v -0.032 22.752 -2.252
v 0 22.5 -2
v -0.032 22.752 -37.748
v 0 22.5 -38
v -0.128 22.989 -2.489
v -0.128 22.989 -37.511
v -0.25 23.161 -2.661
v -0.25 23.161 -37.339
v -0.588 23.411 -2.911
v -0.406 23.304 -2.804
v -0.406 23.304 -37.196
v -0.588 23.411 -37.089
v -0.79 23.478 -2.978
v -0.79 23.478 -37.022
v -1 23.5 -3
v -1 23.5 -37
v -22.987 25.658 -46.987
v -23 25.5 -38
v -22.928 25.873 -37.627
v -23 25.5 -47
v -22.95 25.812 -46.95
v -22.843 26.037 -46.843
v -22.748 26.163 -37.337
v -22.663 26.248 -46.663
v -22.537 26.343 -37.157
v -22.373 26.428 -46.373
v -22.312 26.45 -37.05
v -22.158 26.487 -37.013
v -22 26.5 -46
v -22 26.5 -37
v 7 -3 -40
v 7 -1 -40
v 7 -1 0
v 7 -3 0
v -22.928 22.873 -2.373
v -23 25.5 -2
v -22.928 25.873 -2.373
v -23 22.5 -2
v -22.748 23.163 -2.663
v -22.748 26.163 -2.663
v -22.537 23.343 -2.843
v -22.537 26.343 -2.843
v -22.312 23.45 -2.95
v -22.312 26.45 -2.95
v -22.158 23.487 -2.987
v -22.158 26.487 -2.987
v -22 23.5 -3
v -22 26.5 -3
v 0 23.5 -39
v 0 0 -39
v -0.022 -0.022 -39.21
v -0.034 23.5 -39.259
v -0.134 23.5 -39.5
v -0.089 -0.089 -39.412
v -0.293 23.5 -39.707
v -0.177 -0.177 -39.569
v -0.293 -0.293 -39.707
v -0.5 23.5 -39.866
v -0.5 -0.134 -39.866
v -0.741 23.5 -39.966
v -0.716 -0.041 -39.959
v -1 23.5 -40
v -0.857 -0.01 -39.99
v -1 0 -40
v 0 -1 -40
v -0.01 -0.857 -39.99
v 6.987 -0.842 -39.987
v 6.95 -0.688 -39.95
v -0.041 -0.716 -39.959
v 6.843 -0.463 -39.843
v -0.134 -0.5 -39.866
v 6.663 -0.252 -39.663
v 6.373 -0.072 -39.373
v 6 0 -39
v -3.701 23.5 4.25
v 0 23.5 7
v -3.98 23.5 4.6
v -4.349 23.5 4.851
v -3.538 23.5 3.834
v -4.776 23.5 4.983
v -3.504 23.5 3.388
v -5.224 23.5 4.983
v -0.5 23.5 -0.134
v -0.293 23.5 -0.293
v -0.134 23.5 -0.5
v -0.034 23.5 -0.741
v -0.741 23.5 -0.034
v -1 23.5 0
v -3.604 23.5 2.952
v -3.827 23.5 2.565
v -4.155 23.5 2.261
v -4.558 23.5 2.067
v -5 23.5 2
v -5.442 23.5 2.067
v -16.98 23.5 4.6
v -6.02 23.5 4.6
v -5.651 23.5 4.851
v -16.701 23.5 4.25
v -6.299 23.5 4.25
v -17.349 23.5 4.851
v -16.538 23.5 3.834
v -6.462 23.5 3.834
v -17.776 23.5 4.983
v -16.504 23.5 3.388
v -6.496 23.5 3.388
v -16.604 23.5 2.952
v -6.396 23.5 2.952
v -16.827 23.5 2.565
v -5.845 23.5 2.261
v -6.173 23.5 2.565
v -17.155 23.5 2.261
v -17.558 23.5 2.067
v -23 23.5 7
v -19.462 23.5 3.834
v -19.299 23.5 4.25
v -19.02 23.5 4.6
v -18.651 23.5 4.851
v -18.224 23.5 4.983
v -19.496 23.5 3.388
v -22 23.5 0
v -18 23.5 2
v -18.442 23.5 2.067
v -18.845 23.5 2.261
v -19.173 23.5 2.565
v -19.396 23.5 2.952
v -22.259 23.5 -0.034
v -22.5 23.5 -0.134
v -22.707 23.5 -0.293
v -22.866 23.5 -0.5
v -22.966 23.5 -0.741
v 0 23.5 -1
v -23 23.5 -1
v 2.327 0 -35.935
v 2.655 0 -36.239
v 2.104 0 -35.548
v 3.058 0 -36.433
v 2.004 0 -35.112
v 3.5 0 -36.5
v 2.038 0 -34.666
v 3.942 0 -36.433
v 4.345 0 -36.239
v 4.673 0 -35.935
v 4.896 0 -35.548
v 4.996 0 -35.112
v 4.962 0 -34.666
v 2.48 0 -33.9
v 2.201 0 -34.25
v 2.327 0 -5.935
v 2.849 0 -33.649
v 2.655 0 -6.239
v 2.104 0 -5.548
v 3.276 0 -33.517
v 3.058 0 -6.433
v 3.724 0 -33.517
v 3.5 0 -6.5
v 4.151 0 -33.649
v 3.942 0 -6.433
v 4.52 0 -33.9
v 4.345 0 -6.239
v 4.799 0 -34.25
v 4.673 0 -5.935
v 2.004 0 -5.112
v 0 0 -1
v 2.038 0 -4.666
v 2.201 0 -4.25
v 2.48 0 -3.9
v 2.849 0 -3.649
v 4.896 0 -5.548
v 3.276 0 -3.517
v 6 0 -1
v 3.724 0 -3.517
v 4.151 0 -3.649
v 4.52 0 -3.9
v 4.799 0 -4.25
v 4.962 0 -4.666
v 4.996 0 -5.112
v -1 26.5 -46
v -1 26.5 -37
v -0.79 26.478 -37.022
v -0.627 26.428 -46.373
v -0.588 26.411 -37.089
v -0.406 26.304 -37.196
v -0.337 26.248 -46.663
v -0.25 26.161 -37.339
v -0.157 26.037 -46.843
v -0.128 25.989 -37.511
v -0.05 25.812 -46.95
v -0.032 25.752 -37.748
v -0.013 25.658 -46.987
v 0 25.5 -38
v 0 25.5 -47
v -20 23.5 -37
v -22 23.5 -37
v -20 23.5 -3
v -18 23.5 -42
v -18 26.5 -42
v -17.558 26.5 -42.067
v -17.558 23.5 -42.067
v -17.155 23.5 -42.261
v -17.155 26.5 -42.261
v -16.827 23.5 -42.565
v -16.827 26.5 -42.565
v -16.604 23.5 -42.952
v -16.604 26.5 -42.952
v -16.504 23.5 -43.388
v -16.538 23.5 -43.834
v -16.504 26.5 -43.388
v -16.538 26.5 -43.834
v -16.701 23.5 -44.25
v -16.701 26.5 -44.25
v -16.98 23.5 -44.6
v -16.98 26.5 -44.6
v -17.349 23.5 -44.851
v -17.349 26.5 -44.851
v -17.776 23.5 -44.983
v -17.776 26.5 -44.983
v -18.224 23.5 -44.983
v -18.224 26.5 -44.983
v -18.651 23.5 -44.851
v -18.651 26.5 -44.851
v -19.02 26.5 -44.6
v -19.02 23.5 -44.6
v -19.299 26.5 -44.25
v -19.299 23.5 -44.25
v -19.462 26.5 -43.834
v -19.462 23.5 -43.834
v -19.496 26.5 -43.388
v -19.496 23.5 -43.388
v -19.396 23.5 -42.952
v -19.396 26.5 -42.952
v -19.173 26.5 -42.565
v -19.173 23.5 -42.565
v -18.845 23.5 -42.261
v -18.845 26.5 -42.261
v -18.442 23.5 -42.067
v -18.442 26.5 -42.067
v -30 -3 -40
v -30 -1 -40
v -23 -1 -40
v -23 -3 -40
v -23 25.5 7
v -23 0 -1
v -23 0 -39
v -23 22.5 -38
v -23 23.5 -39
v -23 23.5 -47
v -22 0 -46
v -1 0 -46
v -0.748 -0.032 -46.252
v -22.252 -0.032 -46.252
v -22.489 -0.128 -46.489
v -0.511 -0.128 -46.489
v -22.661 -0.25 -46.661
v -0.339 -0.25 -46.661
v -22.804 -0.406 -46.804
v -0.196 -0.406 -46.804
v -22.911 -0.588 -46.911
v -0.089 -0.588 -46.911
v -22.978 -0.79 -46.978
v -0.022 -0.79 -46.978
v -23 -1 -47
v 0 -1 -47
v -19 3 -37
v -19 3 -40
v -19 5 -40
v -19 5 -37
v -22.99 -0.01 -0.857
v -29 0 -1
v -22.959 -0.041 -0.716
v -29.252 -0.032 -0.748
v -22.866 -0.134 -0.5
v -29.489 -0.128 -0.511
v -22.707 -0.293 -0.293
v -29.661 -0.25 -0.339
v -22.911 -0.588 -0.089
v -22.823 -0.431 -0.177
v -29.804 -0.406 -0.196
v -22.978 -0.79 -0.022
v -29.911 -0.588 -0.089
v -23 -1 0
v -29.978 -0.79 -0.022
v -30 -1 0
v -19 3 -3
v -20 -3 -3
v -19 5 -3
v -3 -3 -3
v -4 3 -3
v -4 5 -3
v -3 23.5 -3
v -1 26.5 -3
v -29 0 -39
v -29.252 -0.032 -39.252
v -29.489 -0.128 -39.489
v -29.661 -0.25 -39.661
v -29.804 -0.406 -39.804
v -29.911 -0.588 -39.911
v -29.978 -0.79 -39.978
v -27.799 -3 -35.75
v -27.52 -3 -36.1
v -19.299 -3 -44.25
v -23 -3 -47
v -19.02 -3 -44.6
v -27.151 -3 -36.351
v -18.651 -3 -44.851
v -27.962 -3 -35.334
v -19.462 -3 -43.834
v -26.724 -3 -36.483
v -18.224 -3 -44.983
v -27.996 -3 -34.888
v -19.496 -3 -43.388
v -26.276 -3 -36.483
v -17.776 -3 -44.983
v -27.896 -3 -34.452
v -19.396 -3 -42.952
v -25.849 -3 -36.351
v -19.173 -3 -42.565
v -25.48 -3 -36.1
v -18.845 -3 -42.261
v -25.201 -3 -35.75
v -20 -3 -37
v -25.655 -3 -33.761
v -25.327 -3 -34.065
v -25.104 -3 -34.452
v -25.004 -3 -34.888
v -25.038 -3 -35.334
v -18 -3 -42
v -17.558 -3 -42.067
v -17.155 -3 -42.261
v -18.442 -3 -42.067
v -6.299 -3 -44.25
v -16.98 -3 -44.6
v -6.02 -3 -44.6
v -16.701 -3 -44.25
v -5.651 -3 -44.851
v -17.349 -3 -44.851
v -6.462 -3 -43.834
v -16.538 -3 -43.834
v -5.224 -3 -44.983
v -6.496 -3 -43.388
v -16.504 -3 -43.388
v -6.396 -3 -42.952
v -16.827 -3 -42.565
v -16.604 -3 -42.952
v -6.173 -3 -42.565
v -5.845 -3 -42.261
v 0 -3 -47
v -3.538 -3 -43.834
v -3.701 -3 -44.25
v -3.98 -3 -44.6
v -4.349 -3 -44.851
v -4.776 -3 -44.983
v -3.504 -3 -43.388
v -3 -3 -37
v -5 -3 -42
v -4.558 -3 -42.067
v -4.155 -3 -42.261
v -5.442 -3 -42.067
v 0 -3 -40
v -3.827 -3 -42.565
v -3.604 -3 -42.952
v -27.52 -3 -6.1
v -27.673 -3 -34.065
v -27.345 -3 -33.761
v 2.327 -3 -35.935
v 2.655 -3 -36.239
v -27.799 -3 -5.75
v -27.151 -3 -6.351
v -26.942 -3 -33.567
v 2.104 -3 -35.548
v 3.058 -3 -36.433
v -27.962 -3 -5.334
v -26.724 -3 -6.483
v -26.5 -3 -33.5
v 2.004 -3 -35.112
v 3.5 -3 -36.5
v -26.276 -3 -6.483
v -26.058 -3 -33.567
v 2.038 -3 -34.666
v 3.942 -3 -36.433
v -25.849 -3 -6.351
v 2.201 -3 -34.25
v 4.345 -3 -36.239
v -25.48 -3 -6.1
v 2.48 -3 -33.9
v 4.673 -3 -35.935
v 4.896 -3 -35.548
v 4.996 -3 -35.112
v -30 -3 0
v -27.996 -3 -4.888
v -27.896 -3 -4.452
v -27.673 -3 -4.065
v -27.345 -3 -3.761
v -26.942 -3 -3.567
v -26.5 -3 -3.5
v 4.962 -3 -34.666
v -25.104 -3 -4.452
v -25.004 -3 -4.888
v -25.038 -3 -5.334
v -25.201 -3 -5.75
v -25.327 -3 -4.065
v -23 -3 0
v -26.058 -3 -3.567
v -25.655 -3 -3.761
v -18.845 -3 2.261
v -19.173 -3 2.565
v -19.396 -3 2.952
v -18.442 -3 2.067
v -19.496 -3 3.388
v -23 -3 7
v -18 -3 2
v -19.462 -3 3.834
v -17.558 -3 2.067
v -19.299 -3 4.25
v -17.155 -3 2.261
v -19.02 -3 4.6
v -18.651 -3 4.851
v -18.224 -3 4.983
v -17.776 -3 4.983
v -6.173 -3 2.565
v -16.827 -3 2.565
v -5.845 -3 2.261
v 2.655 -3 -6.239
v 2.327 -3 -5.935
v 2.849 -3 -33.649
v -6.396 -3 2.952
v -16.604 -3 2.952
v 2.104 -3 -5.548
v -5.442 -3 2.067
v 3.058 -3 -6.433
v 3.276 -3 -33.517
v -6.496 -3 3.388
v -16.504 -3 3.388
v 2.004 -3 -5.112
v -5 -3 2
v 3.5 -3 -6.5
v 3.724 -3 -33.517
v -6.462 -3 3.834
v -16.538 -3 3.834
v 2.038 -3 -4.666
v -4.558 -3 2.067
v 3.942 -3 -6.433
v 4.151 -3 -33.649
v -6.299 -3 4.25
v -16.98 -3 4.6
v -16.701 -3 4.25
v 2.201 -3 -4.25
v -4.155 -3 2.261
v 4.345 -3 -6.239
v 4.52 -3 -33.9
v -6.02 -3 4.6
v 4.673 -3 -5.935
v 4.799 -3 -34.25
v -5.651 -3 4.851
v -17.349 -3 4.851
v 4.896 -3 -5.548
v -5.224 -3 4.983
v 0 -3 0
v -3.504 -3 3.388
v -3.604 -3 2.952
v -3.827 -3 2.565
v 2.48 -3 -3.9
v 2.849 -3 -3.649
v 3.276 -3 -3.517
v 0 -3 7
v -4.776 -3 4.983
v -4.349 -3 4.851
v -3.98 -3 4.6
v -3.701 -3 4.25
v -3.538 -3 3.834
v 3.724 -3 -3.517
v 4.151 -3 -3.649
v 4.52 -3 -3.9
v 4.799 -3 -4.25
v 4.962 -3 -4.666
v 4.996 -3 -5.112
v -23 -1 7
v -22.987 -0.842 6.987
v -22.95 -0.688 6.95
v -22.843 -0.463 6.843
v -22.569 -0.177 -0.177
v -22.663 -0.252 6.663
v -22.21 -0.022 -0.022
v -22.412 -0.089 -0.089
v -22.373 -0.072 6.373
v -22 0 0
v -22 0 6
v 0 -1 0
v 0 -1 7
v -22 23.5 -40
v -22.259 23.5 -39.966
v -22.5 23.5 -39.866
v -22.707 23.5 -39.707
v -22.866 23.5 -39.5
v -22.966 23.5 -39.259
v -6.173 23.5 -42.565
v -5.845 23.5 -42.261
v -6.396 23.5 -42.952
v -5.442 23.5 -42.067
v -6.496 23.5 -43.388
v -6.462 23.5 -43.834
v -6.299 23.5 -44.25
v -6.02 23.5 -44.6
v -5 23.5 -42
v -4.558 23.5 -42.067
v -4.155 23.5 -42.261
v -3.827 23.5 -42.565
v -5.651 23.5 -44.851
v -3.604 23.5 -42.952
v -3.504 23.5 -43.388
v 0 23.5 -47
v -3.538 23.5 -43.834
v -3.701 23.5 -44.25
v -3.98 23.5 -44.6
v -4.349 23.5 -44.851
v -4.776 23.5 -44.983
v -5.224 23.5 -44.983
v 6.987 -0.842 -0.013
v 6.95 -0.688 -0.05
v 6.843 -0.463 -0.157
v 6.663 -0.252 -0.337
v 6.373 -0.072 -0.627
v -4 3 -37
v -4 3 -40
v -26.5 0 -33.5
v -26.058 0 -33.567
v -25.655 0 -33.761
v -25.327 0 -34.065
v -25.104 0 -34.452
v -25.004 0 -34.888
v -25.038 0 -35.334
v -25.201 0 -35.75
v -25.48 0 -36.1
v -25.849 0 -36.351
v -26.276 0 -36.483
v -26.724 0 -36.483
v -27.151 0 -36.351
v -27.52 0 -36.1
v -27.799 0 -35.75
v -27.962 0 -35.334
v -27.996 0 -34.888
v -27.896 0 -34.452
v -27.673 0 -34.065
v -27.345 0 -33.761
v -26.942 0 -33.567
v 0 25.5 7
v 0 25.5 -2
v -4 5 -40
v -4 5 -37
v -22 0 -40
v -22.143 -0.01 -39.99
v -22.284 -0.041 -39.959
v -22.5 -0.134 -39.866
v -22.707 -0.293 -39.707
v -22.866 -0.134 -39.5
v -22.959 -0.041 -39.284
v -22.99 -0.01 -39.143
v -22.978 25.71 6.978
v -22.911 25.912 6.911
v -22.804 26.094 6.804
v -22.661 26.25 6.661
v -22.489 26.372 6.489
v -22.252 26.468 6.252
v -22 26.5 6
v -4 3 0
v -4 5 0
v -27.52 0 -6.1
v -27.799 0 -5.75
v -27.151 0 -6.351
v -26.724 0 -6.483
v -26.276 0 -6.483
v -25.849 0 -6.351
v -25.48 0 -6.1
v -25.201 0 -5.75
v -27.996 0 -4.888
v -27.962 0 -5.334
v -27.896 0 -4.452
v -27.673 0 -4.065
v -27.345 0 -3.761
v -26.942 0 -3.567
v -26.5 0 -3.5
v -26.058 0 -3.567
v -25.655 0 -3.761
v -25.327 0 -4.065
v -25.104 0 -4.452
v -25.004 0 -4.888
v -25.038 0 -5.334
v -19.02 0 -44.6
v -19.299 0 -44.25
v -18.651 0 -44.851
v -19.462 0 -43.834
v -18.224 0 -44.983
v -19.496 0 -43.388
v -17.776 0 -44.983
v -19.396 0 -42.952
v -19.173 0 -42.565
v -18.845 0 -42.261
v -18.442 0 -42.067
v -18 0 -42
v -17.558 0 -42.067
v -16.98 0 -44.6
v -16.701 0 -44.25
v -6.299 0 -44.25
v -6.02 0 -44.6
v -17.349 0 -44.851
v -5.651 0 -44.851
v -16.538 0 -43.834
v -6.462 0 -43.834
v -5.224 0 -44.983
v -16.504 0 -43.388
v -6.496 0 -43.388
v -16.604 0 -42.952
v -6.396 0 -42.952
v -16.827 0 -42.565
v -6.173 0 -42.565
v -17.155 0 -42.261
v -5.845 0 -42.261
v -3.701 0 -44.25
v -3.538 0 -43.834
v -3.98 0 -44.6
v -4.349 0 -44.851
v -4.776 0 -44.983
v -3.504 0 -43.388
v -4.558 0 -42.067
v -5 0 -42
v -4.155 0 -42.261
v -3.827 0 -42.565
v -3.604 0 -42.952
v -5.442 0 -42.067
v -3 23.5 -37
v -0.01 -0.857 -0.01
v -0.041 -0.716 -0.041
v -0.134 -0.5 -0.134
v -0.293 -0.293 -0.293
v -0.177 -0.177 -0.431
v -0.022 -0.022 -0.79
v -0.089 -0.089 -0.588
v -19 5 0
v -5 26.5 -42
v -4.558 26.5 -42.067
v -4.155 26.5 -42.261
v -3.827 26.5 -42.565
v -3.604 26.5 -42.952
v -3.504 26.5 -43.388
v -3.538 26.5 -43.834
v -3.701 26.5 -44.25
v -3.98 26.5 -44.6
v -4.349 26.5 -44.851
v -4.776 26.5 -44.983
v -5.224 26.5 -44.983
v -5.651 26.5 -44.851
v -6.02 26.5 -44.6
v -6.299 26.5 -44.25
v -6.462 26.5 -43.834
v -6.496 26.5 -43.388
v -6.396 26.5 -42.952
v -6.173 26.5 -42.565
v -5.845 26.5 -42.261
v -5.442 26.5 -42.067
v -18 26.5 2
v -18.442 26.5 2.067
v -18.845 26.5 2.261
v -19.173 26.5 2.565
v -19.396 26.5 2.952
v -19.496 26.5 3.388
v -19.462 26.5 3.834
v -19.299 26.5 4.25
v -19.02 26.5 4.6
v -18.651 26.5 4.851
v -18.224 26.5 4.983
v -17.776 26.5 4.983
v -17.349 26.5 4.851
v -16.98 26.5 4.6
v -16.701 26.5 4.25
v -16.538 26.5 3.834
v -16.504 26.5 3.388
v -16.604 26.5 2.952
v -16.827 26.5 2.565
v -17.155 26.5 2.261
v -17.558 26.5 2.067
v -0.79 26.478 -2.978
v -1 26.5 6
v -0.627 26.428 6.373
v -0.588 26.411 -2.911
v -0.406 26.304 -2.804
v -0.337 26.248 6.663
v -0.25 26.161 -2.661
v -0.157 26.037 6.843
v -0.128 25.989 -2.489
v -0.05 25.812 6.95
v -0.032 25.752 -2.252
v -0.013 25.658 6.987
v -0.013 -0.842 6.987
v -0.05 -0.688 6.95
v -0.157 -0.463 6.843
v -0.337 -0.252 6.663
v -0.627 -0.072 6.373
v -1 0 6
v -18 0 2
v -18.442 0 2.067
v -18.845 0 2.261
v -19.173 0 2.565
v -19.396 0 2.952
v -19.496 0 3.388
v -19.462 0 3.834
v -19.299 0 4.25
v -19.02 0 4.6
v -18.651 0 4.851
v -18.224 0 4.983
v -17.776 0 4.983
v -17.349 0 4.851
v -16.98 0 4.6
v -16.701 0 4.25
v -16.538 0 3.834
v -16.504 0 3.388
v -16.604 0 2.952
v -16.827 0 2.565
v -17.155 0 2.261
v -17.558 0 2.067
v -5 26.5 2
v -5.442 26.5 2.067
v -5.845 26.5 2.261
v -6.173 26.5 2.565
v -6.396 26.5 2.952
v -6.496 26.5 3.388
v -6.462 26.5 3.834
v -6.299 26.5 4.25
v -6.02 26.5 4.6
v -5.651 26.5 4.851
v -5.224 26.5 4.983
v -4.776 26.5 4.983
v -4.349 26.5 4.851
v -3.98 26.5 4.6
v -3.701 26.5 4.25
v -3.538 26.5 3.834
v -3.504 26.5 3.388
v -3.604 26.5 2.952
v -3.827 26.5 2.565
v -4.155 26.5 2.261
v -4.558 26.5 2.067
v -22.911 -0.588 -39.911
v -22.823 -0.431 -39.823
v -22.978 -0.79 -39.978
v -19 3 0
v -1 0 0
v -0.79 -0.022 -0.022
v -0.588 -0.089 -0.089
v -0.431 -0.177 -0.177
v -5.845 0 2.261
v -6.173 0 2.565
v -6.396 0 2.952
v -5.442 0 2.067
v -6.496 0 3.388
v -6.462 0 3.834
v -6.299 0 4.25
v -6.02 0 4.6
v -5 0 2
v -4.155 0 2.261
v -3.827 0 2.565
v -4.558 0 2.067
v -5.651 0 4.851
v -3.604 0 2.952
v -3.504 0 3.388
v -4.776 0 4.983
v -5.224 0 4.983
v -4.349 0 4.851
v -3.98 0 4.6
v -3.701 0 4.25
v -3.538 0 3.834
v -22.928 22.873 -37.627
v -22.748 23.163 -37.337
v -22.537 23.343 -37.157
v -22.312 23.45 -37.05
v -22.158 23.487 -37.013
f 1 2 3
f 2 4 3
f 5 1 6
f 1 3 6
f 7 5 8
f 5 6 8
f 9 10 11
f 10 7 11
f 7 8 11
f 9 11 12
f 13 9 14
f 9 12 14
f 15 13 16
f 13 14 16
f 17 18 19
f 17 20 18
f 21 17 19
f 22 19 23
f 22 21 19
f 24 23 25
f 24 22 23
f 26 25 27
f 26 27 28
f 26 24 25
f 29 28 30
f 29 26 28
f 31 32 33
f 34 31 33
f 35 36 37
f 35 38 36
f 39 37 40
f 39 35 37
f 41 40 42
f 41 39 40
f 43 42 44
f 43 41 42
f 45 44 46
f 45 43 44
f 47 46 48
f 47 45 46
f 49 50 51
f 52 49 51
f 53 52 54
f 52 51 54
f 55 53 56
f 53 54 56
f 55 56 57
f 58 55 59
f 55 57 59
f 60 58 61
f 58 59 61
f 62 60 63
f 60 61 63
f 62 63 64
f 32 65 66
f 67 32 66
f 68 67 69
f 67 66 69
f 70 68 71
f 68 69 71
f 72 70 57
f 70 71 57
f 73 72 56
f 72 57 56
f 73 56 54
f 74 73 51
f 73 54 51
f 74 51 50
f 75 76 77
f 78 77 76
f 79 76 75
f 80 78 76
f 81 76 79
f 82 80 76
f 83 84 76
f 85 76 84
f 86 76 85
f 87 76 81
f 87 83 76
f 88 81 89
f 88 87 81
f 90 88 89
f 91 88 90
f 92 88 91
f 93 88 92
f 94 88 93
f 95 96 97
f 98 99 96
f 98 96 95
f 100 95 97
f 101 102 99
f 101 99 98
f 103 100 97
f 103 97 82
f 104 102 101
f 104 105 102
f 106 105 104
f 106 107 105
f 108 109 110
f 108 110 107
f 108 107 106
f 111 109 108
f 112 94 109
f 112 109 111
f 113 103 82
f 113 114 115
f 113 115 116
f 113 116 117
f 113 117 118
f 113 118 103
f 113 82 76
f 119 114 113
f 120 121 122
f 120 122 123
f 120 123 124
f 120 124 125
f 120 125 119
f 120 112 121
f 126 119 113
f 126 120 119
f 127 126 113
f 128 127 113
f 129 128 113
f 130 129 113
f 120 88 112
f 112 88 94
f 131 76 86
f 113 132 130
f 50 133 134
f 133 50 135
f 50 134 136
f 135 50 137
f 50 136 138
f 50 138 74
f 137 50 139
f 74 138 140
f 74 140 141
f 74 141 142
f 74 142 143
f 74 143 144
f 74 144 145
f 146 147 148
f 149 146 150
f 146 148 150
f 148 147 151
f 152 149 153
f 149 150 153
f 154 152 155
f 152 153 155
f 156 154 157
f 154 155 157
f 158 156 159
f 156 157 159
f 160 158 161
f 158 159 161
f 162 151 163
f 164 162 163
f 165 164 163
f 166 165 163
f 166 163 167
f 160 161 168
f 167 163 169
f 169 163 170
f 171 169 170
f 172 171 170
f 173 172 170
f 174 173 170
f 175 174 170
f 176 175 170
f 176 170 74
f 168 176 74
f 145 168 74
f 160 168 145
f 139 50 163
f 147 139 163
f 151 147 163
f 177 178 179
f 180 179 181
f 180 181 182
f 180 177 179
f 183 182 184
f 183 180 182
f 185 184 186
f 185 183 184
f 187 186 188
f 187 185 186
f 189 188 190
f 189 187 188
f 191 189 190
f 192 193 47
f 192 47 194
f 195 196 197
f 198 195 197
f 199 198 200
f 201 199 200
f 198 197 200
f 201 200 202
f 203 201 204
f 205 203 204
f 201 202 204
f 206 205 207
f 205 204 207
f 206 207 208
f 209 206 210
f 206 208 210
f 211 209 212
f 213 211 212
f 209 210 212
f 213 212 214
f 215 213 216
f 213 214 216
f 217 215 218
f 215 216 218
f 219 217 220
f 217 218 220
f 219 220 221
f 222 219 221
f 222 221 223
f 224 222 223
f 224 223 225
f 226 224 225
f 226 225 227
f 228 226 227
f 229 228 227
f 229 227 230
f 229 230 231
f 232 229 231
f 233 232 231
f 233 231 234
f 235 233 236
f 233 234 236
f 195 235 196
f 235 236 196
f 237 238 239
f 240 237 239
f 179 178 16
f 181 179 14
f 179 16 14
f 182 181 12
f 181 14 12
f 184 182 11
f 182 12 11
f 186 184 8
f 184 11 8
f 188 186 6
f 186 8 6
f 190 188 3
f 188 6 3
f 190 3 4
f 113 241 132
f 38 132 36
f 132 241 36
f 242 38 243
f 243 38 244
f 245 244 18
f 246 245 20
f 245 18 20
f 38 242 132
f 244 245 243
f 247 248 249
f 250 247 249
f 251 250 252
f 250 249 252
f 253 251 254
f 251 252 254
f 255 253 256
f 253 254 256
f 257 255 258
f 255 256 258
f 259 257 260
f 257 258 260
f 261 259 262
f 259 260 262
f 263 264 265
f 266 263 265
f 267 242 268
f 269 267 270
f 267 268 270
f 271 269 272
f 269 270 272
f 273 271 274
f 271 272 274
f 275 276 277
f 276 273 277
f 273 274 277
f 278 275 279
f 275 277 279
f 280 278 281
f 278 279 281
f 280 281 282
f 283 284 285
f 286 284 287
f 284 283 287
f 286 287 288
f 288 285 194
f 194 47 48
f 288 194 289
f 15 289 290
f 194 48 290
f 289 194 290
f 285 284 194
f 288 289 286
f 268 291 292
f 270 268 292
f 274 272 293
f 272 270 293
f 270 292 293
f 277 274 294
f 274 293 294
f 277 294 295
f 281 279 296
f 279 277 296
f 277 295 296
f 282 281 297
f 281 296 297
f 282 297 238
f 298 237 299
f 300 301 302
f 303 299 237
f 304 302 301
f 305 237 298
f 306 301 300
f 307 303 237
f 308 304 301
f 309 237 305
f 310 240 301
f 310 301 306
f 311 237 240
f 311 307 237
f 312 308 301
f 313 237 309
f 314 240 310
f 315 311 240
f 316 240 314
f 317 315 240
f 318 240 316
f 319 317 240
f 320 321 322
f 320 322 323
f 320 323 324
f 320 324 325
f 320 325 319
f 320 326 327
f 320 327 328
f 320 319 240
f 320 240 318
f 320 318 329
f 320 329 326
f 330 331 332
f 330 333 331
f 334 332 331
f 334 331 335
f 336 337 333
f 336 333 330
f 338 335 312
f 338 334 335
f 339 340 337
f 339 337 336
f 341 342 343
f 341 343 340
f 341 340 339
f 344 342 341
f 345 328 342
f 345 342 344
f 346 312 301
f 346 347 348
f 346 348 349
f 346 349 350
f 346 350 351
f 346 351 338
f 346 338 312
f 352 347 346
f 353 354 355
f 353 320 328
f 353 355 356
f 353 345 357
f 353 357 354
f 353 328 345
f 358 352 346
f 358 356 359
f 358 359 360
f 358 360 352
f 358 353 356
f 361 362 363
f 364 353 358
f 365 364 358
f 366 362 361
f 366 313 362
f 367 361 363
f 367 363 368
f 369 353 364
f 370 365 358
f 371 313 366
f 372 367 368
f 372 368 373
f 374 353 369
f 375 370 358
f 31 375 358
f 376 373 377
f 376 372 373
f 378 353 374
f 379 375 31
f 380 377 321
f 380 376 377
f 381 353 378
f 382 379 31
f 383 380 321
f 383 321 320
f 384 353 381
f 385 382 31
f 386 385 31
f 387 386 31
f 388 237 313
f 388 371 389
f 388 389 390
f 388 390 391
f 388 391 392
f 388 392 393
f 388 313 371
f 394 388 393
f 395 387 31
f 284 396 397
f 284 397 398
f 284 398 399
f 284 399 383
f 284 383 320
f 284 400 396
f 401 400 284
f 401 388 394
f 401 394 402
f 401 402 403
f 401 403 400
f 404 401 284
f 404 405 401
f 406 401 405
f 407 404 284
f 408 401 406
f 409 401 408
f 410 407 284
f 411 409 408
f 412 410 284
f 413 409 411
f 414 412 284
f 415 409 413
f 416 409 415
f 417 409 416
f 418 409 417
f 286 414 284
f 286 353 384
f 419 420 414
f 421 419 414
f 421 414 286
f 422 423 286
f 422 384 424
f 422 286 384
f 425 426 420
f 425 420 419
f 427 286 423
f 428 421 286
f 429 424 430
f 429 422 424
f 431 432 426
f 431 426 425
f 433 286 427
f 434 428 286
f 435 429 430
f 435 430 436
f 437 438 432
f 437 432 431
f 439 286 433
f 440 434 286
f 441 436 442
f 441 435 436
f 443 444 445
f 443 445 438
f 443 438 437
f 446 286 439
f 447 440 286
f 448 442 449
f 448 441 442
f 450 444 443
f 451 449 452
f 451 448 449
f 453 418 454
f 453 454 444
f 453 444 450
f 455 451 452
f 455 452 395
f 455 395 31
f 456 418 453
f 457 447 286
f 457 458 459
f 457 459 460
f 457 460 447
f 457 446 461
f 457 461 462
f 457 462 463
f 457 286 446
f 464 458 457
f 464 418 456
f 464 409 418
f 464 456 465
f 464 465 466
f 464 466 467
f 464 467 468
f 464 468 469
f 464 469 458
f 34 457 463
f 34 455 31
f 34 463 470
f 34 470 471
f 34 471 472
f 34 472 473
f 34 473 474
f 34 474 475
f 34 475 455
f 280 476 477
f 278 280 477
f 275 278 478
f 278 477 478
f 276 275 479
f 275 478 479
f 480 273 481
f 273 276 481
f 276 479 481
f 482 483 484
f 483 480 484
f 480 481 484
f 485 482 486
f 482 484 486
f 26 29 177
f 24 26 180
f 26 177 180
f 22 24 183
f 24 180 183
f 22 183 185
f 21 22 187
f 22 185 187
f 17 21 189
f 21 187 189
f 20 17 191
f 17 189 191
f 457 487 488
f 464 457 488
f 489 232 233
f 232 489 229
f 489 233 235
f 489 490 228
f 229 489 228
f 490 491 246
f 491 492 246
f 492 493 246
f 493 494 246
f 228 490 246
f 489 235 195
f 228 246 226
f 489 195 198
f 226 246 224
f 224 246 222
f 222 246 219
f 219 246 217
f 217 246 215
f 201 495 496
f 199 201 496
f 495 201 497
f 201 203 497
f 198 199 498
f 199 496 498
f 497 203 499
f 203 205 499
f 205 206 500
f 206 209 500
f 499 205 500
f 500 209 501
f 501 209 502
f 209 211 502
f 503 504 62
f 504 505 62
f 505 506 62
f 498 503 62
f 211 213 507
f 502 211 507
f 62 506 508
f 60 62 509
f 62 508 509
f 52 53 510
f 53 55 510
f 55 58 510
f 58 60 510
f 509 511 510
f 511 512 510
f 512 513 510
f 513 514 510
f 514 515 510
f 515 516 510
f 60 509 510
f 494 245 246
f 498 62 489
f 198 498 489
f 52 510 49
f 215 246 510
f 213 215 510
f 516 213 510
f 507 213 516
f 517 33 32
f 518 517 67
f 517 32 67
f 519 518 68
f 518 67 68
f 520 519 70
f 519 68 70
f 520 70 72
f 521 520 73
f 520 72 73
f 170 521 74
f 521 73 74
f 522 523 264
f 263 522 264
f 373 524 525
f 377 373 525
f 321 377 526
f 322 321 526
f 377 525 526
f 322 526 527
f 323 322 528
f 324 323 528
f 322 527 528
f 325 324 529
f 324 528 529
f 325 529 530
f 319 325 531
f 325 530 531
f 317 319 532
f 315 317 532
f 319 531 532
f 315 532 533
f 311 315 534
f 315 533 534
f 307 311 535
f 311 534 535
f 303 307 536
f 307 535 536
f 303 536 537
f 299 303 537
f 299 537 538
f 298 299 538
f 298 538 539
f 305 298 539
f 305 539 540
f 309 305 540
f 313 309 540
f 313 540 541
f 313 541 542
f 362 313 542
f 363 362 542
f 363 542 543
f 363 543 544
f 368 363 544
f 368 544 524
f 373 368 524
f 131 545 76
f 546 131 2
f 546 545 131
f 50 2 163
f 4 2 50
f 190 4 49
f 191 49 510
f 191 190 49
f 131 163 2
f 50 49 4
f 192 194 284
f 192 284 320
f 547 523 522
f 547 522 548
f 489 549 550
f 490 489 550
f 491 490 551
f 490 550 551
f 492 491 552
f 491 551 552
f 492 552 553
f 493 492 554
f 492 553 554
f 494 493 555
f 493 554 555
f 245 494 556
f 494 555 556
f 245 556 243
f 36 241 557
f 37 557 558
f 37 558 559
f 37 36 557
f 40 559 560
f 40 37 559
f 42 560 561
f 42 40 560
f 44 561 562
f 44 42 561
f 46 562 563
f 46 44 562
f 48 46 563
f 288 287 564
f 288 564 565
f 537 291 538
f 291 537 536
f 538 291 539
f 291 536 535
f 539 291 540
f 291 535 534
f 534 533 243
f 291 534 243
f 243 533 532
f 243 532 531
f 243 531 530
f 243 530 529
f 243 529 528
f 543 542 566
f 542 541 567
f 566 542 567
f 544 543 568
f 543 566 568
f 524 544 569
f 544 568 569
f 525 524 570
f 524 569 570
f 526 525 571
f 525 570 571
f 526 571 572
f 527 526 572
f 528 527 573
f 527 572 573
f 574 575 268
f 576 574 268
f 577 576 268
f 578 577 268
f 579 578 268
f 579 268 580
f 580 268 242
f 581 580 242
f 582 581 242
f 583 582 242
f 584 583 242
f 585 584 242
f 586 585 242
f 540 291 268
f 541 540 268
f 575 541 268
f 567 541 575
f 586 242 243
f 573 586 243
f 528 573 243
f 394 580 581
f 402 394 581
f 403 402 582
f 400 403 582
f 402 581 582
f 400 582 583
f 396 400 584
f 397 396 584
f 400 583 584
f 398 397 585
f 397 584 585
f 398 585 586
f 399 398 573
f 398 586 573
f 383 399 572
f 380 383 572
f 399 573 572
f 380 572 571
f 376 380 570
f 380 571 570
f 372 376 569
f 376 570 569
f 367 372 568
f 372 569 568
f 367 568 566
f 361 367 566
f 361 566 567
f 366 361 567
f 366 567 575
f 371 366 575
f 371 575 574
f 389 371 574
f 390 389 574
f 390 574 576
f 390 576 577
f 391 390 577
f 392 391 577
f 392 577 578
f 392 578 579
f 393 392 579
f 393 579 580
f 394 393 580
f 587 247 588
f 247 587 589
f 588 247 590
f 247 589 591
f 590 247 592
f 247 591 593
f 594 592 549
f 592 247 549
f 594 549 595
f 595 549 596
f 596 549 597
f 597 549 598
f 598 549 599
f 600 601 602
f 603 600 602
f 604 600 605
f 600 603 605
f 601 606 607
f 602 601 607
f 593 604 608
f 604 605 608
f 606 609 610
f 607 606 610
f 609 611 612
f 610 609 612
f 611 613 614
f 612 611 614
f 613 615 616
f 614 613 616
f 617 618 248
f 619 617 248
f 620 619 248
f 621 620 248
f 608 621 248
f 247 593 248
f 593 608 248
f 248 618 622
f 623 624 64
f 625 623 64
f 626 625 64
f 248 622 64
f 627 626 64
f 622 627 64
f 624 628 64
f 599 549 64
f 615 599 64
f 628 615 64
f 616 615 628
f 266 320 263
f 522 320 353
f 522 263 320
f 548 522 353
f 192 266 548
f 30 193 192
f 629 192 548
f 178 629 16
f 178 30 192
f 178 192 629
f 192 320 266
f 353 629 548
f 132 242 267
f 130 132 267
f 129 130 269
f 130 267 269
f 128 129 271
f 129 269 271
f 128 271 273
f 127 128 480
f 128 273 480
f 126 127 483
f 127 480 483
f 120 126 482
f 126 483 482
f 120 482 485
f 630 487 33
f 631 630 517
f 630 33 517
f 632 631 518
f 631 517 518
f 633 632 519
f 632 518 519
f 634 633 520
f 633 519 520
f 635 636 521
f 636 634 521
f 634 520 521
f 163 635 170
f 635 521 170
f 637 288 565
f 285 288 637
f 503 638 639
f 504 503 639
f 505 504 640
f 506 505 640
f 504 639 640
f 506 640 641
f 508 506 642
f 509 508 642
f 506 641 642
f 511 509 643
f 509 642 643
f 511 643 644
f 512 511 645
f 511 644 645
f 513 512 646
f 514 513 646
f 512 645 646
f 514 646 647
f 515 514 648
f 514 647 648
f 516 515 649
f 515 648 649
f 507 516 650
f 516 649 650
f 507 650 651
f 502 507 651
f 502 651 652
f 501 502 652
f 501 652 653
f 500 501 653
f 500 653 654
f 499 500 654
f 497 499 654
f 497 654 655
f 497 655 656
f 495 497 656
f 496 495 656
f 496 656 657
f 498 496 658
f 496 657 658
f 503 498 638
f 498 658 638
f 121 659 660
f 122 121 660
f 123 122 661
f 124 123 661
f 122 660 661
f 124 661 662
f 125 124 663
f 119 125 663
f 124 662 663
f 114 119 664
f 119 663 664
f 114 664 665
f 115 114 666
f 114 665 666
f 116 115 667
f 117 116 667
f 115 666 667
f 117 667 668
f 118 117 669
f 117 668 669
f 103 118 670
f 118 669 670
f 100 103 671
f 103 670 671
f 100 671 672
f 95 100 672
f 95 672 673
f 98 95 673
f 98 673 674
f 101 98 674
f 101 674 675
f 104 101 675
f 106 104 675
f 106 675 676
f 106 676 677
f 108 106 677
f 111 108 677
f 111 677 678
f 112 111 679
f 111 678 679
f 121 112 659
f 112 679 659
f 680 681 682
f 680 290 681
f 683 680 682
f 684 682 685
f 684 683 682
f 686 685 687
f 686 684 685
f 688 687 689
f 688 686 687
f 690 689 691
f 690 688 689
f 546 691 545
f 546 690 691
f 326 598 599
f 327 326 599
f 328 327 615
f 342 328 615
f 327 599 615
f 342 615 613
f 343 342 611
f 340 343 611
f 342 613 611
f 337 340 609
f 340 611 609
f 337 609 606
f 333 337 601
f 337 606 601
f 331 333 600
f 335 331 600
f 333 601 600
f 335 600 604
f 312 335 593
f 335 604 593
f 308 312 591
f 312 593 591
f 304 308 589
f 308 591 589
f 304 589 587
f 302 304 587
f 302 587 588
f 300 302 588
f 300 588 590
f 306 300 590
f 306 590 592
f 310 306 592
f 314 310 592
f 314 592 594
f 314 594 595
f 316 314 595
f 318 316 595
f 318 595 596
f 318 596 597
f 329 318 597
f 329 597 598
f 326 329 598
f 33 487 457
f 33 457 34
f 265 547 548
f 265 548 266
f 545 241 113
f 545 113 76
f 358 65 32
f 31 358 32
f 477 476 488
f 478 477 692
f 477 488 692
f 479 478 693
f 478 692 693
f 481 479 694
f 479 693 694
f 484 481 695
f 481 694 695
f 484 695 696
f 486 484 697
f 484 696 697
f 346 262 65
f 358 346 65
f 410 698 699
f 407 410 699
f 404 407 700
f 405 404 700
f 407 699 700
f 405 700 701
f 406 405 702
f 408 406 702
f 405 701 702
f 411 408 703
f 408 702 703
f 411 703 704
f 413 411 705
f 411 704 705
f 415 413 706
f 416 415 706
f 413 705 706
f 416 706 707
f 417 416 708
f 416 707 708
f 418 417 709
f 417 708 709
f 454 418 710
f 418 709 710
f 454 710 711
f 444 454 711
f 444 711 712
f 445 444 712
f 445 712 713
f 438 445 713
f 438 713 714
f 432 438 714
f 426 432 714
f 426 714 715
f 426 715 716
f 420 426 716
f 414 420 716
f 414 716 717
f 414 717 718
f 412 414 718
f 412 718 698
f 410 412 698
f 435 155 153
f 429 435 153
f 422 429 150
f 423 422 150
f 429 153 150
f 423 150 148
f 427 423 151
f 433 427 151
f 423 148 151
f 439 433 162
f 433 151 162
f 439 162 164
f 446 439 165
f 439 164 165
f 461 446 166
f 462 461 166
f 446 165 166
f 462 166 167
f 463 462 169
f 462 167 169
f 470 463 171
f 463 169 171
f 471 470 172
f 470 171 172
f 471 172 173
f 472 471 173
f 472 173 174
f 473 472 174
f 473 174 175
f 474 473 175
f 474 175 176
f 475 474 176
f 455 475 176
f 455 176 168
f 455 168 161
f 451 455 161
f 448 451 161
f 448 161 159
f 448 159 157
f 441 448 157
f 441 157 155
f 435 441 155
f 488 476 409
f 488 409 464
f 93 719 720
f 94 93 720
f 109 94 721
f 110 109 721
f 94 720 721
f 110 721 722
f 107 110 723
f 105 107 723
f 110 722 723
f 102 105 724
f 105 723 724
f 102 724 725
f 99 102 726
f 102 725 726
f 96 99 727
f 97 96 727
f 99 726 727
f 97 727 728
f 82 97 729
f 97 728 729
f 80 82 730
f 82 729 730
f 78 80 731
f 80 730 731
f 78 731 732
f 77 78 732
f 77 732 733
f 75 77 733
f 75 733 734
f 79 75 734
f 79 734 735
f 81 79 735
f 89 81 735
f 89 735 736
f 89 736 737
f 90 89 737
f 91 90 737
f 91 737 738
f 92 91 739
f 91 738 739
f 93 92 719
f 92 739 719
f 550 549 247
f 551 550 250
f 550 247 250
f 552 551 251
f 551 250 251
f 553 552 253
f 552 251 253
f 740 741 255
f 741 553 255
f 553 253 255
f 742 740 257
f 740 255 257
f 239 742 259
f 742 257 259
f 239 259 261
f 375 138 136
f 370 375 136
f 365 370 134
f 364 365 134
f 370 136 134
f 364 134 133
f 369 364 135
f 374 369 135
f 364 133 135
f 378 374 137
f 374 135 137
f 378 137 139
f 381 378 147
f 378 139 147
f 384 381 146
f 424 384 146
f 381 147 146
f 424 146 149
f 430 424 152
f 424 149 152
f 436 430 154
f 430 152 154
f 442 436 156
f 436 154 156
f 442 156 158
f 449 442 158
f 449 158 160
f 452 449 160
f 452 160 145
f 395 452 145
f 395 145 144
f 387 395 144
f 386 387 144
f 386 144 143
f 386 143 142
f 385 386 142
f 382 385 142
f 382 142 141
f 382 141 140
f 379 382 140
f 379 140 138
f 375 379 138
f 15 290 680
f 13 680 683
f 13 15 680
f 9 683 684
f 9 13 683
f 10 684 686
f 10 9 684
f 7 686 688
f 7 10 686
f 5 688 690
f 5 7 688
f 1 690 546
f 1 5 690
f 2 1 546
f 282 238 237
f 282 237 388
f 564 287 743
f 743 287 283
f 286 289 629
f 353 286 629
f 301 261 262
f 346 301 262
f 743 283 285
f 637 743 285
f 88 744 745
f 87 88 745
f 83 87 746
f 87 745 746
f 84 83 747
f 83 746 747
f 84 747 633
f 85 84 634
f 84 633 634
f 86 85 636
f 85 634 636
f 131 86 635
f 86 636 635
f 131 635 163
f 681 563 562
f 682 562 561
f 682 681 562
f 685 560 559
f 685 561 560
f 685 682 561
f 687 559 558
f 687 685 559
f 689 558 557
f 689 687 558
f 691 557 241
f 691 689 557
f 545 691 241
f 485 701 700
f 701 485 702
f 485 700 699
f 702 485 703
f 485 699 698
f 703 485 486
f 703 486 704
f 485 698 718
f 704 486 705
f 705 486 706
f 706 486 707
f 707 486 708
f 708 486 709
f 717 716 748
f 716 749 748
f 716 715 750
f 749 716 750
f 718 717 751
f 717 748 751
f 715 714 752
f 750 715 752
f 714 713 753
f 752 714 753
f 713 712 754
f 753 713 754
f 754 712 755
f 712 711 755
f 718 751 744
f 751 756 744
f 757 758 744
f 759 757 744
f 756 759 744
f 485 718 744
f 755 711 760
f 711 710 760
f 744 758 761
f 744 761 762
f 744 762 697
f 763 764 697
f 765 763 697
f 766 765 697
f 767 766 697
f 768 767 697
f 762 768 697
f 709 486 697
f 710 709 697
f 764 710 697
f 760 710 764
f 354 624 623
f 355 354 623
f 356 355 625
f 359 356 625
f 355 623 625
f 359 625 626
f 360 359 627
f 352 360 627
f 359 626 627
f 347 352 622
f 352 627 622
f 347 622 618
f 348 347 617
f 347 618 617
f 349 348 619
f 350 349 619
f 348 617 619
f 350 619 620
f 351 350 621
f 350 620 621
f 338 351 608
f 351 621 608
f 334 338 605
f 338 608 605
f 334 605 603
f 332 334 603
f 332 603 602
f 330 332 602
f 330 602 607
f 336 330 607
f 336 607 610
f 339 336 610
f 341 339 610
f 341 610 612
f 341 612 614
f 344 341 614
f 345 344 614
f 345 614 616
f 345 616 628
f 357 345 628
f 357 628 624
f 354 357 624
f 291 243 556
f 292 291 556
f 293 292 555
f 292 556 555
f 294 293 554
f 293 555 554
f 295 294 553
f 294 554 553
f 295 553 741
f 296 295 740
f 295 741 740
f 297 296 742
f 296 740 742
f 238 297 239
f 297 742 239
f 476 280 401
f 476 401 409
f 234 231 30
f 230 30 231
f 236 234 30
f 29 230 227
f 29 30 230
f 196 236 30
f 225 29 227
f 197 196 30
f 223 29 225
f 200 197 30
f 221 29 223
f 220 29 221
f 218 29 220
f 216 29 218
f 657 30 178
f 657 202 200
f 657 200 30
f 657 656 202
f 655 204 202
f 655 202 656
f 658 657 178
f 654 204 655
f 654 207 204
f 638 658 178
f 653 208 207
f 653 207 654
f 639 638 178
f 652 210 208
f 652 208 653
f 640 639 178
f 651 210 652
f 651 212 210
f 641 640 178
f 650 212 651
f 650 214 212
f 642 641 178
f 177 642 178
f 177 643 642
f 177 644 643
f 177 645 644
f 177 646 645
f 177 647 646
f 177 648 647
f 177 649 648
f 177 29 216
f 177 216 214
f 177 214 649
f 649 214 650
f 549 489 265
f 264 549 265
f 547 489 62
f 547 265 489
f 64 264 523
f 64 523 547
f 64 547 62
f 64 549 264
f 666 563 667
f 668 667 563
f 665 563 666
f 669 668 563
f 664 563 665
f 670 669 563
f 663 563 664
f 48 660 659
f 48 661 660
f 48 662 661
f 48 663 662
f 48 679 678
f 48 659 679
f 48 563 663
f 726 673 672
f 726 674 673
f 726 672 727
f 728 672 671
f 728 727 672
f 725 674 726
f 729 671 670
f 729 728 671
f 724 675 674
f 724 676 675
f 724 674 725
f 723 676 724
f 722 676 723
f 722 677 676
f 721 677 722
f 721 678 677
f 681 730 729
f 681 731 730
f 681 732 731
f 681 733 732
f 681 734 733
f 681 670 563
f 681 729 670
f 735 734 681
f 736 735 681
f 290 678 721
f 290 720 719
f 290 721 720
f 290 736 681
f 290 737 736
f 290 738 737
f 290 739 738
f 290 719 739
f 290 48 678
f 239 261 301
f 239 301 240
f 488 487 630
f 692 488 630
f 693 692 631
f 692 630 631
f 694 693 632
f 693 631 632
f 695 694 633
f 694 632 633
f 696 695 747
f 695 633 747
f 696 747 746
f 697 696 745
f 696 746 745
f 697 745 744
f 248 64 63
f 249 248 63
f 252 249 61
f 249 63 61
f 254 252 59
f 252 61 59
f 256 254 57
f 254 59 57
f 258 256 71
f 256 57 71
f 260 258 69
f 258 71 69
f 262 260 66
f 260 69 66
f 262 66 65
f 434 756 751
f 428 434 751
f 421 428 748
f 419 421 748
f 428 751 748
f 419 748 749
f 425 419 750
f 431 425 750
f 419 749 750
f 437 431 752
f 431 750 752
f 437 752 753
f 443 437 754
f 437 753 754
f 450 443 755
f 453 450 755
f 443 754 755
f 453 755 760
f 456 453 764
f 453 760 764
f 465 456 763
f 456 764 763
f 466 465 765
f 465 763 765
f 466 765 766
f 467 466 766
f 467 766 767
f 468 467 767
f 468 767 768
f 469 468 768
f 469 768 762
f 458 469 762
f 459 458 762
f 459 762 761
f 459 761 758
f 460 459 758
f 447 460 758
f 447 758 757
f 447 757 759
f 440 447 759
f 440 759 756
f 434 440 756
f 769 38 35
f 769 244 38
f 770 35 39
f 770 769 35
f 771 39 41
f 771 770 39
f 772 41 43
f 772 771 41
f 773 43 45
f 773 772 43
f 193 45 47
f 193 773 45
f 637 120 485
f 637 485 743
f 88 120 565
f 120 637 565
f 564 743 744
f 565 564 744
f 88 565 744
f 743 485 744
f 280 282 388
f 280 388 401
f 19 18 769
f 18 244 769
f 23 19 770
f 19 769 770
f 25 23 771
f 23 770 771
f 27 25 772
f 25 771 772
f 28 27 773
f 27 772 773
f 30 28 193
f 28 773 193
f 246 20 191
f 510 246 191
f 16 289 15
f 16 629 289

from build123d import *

# Parameters (mm, degrees)
CROQUIS2_W              = 23
CROQUIS2_H              = 40
SALIENTE_EXTRUIR1_DEPTH = 23.5
CROQUIS3_W              = 17
CROQUIS3_H              = 34
CORTAR_EXTRUIR1_DEPTH   = 13.5
CROQUIS4_W              = 13
CROQUIS4_H              = 40
CROQUIS4_W_2            = 23
CROQUIS4_H_2            = 13
SALIENTE_EXTRUIR6_DEPTH = 3
CROQUIS6_R              = 1.5
CORTAR_EXTRUIR2_DEPTH   = 61.508263898
SALIENTE_EXTRUIR7_START = 3
CROQUIS7_W              = 23
CROQUIS7_H              = 10
CROQUIS7_R              = 1.5
SALIENTE_EXTRUIR7_DEPTH = 3
REDONDEO1_R             = 1
REDONDEO2_R             = 1
REDONDEO3_R             = 1
CROQUIS8_W              = 17
CROQUIS8_H              = 34
CORTAR_EXTRUIR3_DEPTH   = 64.081296753
CROQUIS9_W              = 15
CROQUIS9_H              = 2
CORTAR_EXTRUIR4_DEPTH   = 62.735322142


with BuildPart() as part:
    # Croquis2 → Saliente-Extruir1 (new body)
    with BuildSketch(Plane(origin=(0, 0, 0), x_dir=(1, 0, 0), z_dir=(0, 1, 0))):
        with Locations((-11.5, 20)):
            Rectangle(CROQUIS2_W, CROQUIS2_H)
    extrude(amount=SALIENTE_EXTRUIR1_DEPTH)

    # Croquis3 → Cortar-Extruir1 (cut)
    with BuildSketch(Plane(origin=(0, 23.5, 0), x_dir=(1, 0, 0), z_dir=(0, 1, 0))):
        with Locations((-11.5, 20)):
            Rectangle(CROQUIS3_W, CROQUIS3_H)
    extrude(amount=-CORTAR_EXTRUIR1_DEPTH, mode=Mode.SUBTRACT)

    # Croquis4 → Saliente-Extruir6 (add)
    with BuildSketch(Plane.XZ):
        with Locations((-23.5, -20)):
            Rectangle(CROQUIS4_W, CROQUIS4_H)
        with Locations((-11.5, 0.5)):
            Rectangle(CROQUIS4_W_2, CROQUIS4_H_2)
        with Locations((0.5, -20)):
            Rectangle(CROQUIS4_W, CROQUIS4_H)
        with Locations((-11.5, -40.5)):
            Rectangle(CROQUIS4_W_2, CROQUIS4_H_2)
    extrude(amount=SALIENTE_EXTRUIR6_DEPTH)

    # Croquis6 → Cortar-Extruir2 (cut, through all)
    with BuildSketch(Plane(origin=(0, 0, 0), x_dir=(1, 0, 0), z_dir=(0, 1, 0))):
        with Locations(Location((-26.5, 5, 0), (0, 0, 270))):
            Circle(CROQUIS6_R)
        with Locations(Location((-26.5, 35, 0), (0, 0, 270))):
            Circle(CROQUIS6_R)
        with Locations(Location((-18, 43.5, 0), (0, 0, 270))):
            Circle(CROQUIS6_R)
        with Locations(Location((-5, 43.5, 0), (0, 0, 270))):
            Circle(CROQUIS6_R)
        with Locations(Location((3.5, 5, 0), (0, 0, 90))):
            Circle(CROQUIS6_R)
        with Locations(Location((3.5, 35, 0), (0, 0, 90))):
            Circle(CROQUIS6_R)
        with Locations(Location((-5, -3.5, 0), (0, 0, 90))):
            Circle(CROQUIS6_R)
        with Locations(Location((-18, -3.5, 0), (0, 0, 90))):
            Circle(CROQUIS6_R)
    extrude(amount=-CORTAR_EXTRUIR2_DEPTH, mode=Mode.SUBTRACT)

    # Croquis7 → Saliente-Extruir7 (add)
    # profile 1 of 2: a face of its own
    with BuildSketch(Plane(origin=(0, 23.5, 0), x_dir=(1, 0, 0), z_dir=(0, 1, 0)).offset(SALIENTE_EXTRUIR7_START)):
        with Locations((-11.5, 42)):
            Rectangle(CROQUIS7_W, CROQUIS7_H)
        with Locations(Location((-18, 43.5, 0), (0, 0, 270))):
            Circle(CROQUIS7_R, mode=Mode.SUBTRACT)
        with Locations(Location((-5, 43.5, 0), (0, 0, 270))):
            Circle(CROQUIS7_R, mode=Mode.SUBTRACT)
    # profile 2 of 2: a face of its own
    with BuildSketch(Plane(origin=(0, 23.5, 0), x_dir=(1, 0, 0), z_dir=(0, 1, 0)).offset(SALIENTE_EXTRUIR7_START)):
        with Locations((-11.5, -2)):
            Rectangle(CROQUIS7_W, CROQUIS7_H)
        with Locations(Location((-18, -3.5, 0), (0, 0, 90))):
            Circle(CROQUIS7_R, mode=Mode.SUBTRACT)
        with Locations(Location((-5, -3.5, 0), (0, 0, 90))):
            Circle(CROQUIS7_R, mode=Mode.SUBTRACT)
    extrude(amount=-SALIENTE_EXTRUIR7_DEPTH)

    # Redondeo1
    # the kernel refuses this fillet: 1 mm, written as the material it takes off along each edge
    with BuildSketch(Plane(origin=(-23, 0, -40), x_dir=(0, 0, 1), z_dir=(0, 1, 0)), Plane(origin=(-23, 0, 0), x_dir=(1, 0, 0), z_dir=(0, 1, 0))) as redondeo1_piece_1:
        with BuildLine():
            CenterArc((REDONDEO1_R, REDONDEO1_R), REDONDEO1_R, 180, 90)
            Line((0, REDONDEO1_R), (0, 0))
            Line((0, 0), (REDONDEO1_R, 0))
        make_face()
    extrude(amount=23.5, mode=Mode.SUBTRACT)
    with BuildSketch(Plane(origin=(0, 0, -40), x_dir=(0, 0, 1), z_dir=(0, 1, 0)), Plane(origin=(0, 0, 0), x_dir=(-1, 0, 0), z_dir=(0, 1, 0))) as redondeo1_piece_2:
        with BuildLine():
            CenterArc((REDONDEO1_R, -REDONDEO1_R), REDONDEO1_R, 90, 90)
            Line((0, -REDONDEO1_R), (0, 0))
            Line((0, 0), (REDONDEO1_R, 0))
        make_face()
    extrude(amount=23.5, mode=Mode.SUBTRACT)

    # Redondeo2
    # the kernel refuses this fillet: 1 mm, written as the material it takes off along each edge
    with BuildSketch(Plane(origin=(-30, 0, -42.5), x_dir=(1, 0, 0), z_dir=(0, 0, 1))) as redondeo2_piece_1:
        with BuildLine():
            CenterArc((REDONDEO2_R, -REDONDEO2_R), REDONDEO2_R, 90, 90)
            Line((0, -REDONDEO2_R), (0, 0))
            Line((0, 0), (REDONDEO2_R, 0))
        make_face()
    extrude(amount=45, mode=Mode.SUBTRACT)
    with BuildSketch(Plane(origin=(-32.5, 0, 0), x_dir=(0, 0, -1), z_dir=(1, 0, 0)), Plane(origin=(-23, 0, -40), x_dir=(0, 0, 1), z_dir=(-1, 0, 0)), Plane(origin=(0, 0, -40), x_dir=(-1, 0, 0), z_dir=(0, 0, -1)), Plane(origin=(-23, 0, -49.5), x_dir=(1, 0, 0), z_dir=(0, 0, 1))) as redondeo2_piece_2:
        with BuildLine():
            CenterArc((REDONDEO2_R, -REDONDEO2_R), REDONDEO2_R, 90, 90)
            Line((0, -REDONDEO2_R), (0, 0))
            Line((0, 0), (REDONDEO2_R, 0))
        make_face()
    extrude(amount=9.5, mode=Mode.SUBTRACT)
    with BuildSketch(Plane(origin=(9.5, 0, 0), x_dir=(0, 0, -1), z_dir=(-1, 0, 0)), Plane(origin=(-23, 0, 9.5), x_dir=(1, 0, 0), z_dir=(0, 0, -1)), Plane(origin=(0, 0, -40), x_dir=(0, 0, 1), z_dir=(1, 0, 0)), Plane(origin=(0, 0, 0), x_dir=(-1, 0, 0), z_dir=(0, 0, 1))) as redondeo2_piece_3:
        with BuildLine():
            CenterArc((REDONDEO2_R, REDONDEO2_R), REDONDEO2_R, 180, 90)
            Line((0, REDONDEO2_R), (0, 0))
            Line((0, 0), (REDONDEO2_R, 0))
        make_face()
    extrude(amount=9.5, mode=Mode.SUBTRACT)
    with BuildSketch(Plane(origin=(2.5, 0, 7), x_dir=(0, 0, -1), z_dir=(-1, 0, 0))) as redondeo2_piece_4:
        with BuildLine():
            CenterArc((REDONDEO2_R, REDONDEO2_R), REDONDEO2_R, 180, 90)
            Line((0, REDONDEO2_R), (0, 0))
            Line((0, 0), (REDONDEO2_R, 0))
        make_face()
    extrude(amount=28, mode=Mode.SUBTRACT)
    with BuildSketch(Plane(origin=(7, 0, -42.5), x_dir=(-1, 0, 0), z_dir=(0, 0, 1))) as redondeo2_piece_5:
        with BuildLine():
            CenterArc((REDONDEO2_R, REDONDEO2_R), REDONDEO2_R, 180, 90)
            Line((0, REDONDEO2_R), (0, 0))
            Line((0, 0), (REDONDEO2_R, 0))
        make_face()
    extrude(amount=45, mode=Mode.SUBTRACT)
    with BuildSketch(Plane(origin=(2.5, 0, -47), x_dir=(0, 0, 1), z_dir=(-1, 0, 0))) as redondeo2_piece_6:
        with BuildLine():
            CenterArc((REDONDEO2_R, -REDONDEO2_R), REDONDEO2_R, 90, 90)
            Line((0, -REDONDEO2_R), (0, 0))
            Line((0, 0), (REDONDEO2_R, 0))
        make_face()
    extrude(amount=28, mode=Mode.SUBTRACT)
    with BuildSketch(Plane(origin=(-32.5, 0, 0), x_dir=(0, 0, -1), z_dir=(1, 0, 0))) as redondeo2_piece_7a_section:
        with BuildLine():
            CenterArc((REDONDEO2_R, -REDONDEO2_R), REDONDEO2_R, 90, 90)
            Line((0, -REDONDEO2_R), (0, 0))
            Line((0, 0), (REDONDEO2_R, 0))
        make_face()
    redondeo2_piece_7a = extrude(amount=12, mode=Mode.PRIVATE)
    redondeo2_piece_7a = redondeo2_piece_7a - Plane(origin=(-22, -0.287823154, -1), x_dir=(1, 0, 0), z_dir=(0, -1, 0)) * Cylinder(1, 28, mode=Mode.PRIVATE)
    redondeo2_piece_7a = split(redondeo2_piece_7a, bisect_by=Plane(origin=(-23, -0.287823154, -0.287823154), z_dir=(1, 0, 0)), keep=Keep.TOP, mode=Mode.PRIVATE)
    with BuildSketch(Plane(origin=(-23, 0, 9.5), x_dir=(1, 0, 0), z_dir=(0, 0, -1))) as redondeo2_piece_7b_section:
        with BuildLine():
            CenterArc((REDONDEO2_R, REDONDEO2_R), REDONDEO2_R, 180, 90)
            Line((0, REDONDEO2_R), (0, 0))
            Line((0, 0), (REDONDEO2_R, 0))
        make_face()
    redondeo2_piece_7b = extrude(amount=12, mode=Mode.PRIVATE)
    redondeo2_piece_7b = split(redondeo2_piece_7b, bisect_by=Plane(origin=(-22.712176846, -0.287823154, 0), z_dir=(0, 0, -1)), keep=Keep.TOP, mode=Mode.PRIVATE)
    redondeo2_piece_7b = redondeo2_piece_7b - Plane(origin=(-22, -0.287823154, -1), x_dir=(1, 0, 0), z_dir=(0, -1, 0)) * Cylinder(1, 29, mode=Mode.PRIVATE)
    redondeo2_piece_7 = redondeo2_piece_7a & redondeo2_piece_7b
    add(redondeo2_piece_7, mode=Mode.SUBTRACT)
    with BuildSketch(Plane(origin=(-23, 0, -49.5), x_dir=(1, 0, 0), z_dir=(0, 0, 1))) as redondeo2_piece_8a_section:
        with BuildLine():
            CenterArc((REDONDEO2_R, -REDONDEO2_R), REDONDEO2_R, 90, 90)
            Line((0, -REDONDEO2_R), (0, 0))
            Line((0, 0), (REDONDEO2_R, 0))
        make_face()
    redondeo2_piece_8a = extrude(amount=12, mode=Mode.PRIVATE)
    redondeo2_piece_8a = redondeo2_piece_8a - Plane(origin=(-22, -0.287823154, -39), x_dir=(0, 0, 1), z_dir=(0, -1, 0)) * Cylinder(1, 28, mode=Mode.PRIVATE)
    redondeo2_piece_8a = split(redondeo2_piece_8a, bisect_by=Plane(origin=(-22.712176846, -0.287823154, -40), z_dir=(0, 0, 1)), keep=Keep.TOP, mode=Mode.PRIVATE)
    with BuildSketch(Plane(origin=(-20.5, 0, -40), x_dir=(0, 0, 1), z_dir=(-1, 0, 0))) as redondeo2_piece_8b_section:
        with BuildLine():
            CenterArc((REDONDEO2_R, -REDONDEO2_R), REDONDEO2_R, 90, 90)
            Line((0, -REDONDEO2_R), (0, 0))
            Line((0, 0), (REDONDEO2_R, 0))
        make_face()
    redondeo2_piece_8b = extrude(amount=12, mode=Mode.PRIVATE)
    redondeo2_piece_8b = split(redondeo2_piece_8b, bisect_by=Plane(origin=(-23, -0.287823154, -39.712176846), z_dir=(1, 0, 0)), keep=Keep.TOP, mode=Mode.PRIVATE)
    redondeo2_piece_8b = redondeo2_piece_8b - Plane(origin=(-22, -0.287823154, -39), x_dir=(0, 0, 1), z_dir=(0, -1, 0)) * Cylinder(1, 28, mode=Mode.PRIVATE)
    redondeo2_piece_8 = redondeo2_piece_8a & redondeo2_piece_8b
    add(redondeo2_piece_8, mode=Mode.SUBTRACT)
    with BuildSketch(Plane(origin=(0, 0, -2.5), x_dir=(-1, 0, 0), z_dir=(0, 0, 1))) as redondeo2_piece_9a_section:
        with BuildLine():
            CenterArc((REDONDEO2_R, REDONDEO2_R), REDONDEO2_R, 180, 90)
            Line((0, REDONDEO2_R), (0, 0))
            Line((0, 0), (REDONDEO2_R, 0))
        make_face()
    redondeo2_piece_9a = extrude(amount=12, mode=Mode.PRIVATE)
    redondeo2_piece_9a = split(redondeo2_piece_9a, bisect_by=Plane(origin=(-0.287823154, -0.287823154, 0), z_dir=(0, 0, -1)), keep=Keep.TOP, mode=Mode.PRIVATE)
    redondeo2_piece_9a = redondeo2_piece_9a - Plane(origin=(-1, -0.287823154, -1), x_dir=(-1, 0, 0), z_dir=(0, -1, 0)) * Cylinder(1, 29, mode=Mode.PRIVATE)
    with BuildSketch(Plane(origin=(9.5, 0, 0), x_dir=(0, 0, -1), z_dir=(-1, 0, 0))) as redondeo2_piece_9b_section:
        with BuildLine():
            CenterArc((REDONDEO2_R, REDONDEO2_R), REDONDEO2_R, 180, 90)
            Line((0, REDONDEO2_R), (0, 0))
            Line((0, 0), (REDONDEO2_R, 0))
        make_face()
    redondeo2_piece_9b = extrude(amount=12, mode=Mode.PRIVATE)
    redondeo2_piece_9b = split(redondeo2_piece_9b, bisect_by=Plane(origin=(0, -0.287823154, -0.287823154), z_dir=(-1, 0, 0)), keep=Keep.TOP, mode=Mode.PRIVATE)
    redondeo2_piece_9b = redondeo2_piece_9b - Plane(origin=(-1, -0.287823154, -1), x_dir=(-1, 0, 0), z_dir=(0, -1, 0)) * Cylinder(1, 28, mode=Mode.PRIVATE)
    redondeo2_piece_9 = redondeo2_piece_9a & redondeo2_piece_9b
    add(redondeo2_piece_9, mode=Mode.SUBTRACT)
    with BuildSketch(Plane(origin=(-2.5, 0, -40), x_dir=(0, 0, 1), z_dir=(1, 0, 0))) as redondeo2_piece_10a_section:
        with BuildLine():
            CenterArc((REDONDEO2_R, REDONDEO2_R), REDONDEO2_R, 180, 90)
            Line((0, REDONDEO2_R), (0, 0))
            Line((0, 0), (REDONDEO2_R, 0))
        make_face()
    redondeo2_piece_10a = extrude(amount=12, mode=Mode.PRIVATE)
    redondeo2_piece_10a = redondeo2_piece_10a - Plane(origin=(-1, -0.287823154, -39), x_dir=(0, 0, 1), z_dir=(0, -1, 0)) * Cylinder(1, 28, mode=Mode.PRIVATE)
    redondeo2_piece_10a = split(redondeo2_piece_10a, bisect_by=Plane(origin=(0, -0.287823154, -39.712176846), z_dir=(-1, 0, 0)), keep=Keep.TOP, mode=Mode.PRIVATE)
    with BuildSketch(Plane(origin=(0, 0, -37.5), x_dir=(-1, 0, 0), z_dir=(0, 0, -1))) as redondeo2_piece_10b_section:
        with BuildLine():
            CenterArc((REDONDEO2_R, -REDONDEO2_R), REDONDEO2_R, 90, 90)
            Line((0, -REDONDEO2_R), (0, 0))
            Line((0, 0), (REDONDEO2_R, 0))
        make_face()
    redondeo2_piece_10b = extrude(amount=12, mode=Mode.PRIVATE)
    redondeo2_piece_10b = split(redondeo2_piece_10b, bisect_by=Plane(origin=(-0.287823154, -0.287823154, -40), z_dir=(0, 0, 1)), keep=Keep.TOP, mode=Mode.PRIVATE)
    redondeo2_piece_10b = redondeo2_piece_10b - Plane(origin=(-1, -0.287823154, -39), x_dir=(0, 0, 1), z_dir=(0, -1, 0)) * Cylinder(1, 28, mode=Mode.PRIVATE)
    redondeo2_piece_10 = redondeo2_piece_10a & redondeo2_piece_10b
    add(redondeo2_piece_10, mode=Mode.SUBTRACT)

    # Redondeo3
    redondeo3_edges = [part.edges().sort_by_distance(p)[0] for p in [
        (0, 25, -37),
        (0, 25, -3),
        (-23, 25, -3),
        (-23, 25, -37),
        (-23, 23.5, -20),
        (0, 23.5, -20),
        (0, 26.5, 2),
        (-23, 26.5, 2),
        (-11.5, 26.5, 7),
        (0, 26.5, -42),
        (-11.5, 26.5, -47),
        (-23, 26.5, -42),
    ]]
    fillet(redondeo3_edges, radius=REDONDEO3_R)

    # Croquis8 → Cortar-Extruir3 (cut, through all)
    with BuildSketch(Plane(origin=(0, -3, 0), x_dir=(-1, 0, 0), z_dir=(0, -1, 0))):
        with Locations((11.5, 20)):
            Rectangle(CROQUIS8_W, CROQUIS8_H)
    extrude(amount=-CORTAR_EXTRUIR3_DEPTH, mode=Mode.SUBTRACT)

    # Croquis9 → Cortar-Extruir4 (cut, through all)
    with BuildSketch(Plane(origin=(0, 0, -40), x_dir=(-1, 0, 0), z_dir=(0, 0, -1))):
        with Locations((11.5, 4)):
            Rectangle(CROQUIS9_W, CROQUIS9_H)
    extrude(amount=-CORTAR_EXTRUIR4_DEPTH, mode=Mode.SUBTRACT)


solid = part.part
